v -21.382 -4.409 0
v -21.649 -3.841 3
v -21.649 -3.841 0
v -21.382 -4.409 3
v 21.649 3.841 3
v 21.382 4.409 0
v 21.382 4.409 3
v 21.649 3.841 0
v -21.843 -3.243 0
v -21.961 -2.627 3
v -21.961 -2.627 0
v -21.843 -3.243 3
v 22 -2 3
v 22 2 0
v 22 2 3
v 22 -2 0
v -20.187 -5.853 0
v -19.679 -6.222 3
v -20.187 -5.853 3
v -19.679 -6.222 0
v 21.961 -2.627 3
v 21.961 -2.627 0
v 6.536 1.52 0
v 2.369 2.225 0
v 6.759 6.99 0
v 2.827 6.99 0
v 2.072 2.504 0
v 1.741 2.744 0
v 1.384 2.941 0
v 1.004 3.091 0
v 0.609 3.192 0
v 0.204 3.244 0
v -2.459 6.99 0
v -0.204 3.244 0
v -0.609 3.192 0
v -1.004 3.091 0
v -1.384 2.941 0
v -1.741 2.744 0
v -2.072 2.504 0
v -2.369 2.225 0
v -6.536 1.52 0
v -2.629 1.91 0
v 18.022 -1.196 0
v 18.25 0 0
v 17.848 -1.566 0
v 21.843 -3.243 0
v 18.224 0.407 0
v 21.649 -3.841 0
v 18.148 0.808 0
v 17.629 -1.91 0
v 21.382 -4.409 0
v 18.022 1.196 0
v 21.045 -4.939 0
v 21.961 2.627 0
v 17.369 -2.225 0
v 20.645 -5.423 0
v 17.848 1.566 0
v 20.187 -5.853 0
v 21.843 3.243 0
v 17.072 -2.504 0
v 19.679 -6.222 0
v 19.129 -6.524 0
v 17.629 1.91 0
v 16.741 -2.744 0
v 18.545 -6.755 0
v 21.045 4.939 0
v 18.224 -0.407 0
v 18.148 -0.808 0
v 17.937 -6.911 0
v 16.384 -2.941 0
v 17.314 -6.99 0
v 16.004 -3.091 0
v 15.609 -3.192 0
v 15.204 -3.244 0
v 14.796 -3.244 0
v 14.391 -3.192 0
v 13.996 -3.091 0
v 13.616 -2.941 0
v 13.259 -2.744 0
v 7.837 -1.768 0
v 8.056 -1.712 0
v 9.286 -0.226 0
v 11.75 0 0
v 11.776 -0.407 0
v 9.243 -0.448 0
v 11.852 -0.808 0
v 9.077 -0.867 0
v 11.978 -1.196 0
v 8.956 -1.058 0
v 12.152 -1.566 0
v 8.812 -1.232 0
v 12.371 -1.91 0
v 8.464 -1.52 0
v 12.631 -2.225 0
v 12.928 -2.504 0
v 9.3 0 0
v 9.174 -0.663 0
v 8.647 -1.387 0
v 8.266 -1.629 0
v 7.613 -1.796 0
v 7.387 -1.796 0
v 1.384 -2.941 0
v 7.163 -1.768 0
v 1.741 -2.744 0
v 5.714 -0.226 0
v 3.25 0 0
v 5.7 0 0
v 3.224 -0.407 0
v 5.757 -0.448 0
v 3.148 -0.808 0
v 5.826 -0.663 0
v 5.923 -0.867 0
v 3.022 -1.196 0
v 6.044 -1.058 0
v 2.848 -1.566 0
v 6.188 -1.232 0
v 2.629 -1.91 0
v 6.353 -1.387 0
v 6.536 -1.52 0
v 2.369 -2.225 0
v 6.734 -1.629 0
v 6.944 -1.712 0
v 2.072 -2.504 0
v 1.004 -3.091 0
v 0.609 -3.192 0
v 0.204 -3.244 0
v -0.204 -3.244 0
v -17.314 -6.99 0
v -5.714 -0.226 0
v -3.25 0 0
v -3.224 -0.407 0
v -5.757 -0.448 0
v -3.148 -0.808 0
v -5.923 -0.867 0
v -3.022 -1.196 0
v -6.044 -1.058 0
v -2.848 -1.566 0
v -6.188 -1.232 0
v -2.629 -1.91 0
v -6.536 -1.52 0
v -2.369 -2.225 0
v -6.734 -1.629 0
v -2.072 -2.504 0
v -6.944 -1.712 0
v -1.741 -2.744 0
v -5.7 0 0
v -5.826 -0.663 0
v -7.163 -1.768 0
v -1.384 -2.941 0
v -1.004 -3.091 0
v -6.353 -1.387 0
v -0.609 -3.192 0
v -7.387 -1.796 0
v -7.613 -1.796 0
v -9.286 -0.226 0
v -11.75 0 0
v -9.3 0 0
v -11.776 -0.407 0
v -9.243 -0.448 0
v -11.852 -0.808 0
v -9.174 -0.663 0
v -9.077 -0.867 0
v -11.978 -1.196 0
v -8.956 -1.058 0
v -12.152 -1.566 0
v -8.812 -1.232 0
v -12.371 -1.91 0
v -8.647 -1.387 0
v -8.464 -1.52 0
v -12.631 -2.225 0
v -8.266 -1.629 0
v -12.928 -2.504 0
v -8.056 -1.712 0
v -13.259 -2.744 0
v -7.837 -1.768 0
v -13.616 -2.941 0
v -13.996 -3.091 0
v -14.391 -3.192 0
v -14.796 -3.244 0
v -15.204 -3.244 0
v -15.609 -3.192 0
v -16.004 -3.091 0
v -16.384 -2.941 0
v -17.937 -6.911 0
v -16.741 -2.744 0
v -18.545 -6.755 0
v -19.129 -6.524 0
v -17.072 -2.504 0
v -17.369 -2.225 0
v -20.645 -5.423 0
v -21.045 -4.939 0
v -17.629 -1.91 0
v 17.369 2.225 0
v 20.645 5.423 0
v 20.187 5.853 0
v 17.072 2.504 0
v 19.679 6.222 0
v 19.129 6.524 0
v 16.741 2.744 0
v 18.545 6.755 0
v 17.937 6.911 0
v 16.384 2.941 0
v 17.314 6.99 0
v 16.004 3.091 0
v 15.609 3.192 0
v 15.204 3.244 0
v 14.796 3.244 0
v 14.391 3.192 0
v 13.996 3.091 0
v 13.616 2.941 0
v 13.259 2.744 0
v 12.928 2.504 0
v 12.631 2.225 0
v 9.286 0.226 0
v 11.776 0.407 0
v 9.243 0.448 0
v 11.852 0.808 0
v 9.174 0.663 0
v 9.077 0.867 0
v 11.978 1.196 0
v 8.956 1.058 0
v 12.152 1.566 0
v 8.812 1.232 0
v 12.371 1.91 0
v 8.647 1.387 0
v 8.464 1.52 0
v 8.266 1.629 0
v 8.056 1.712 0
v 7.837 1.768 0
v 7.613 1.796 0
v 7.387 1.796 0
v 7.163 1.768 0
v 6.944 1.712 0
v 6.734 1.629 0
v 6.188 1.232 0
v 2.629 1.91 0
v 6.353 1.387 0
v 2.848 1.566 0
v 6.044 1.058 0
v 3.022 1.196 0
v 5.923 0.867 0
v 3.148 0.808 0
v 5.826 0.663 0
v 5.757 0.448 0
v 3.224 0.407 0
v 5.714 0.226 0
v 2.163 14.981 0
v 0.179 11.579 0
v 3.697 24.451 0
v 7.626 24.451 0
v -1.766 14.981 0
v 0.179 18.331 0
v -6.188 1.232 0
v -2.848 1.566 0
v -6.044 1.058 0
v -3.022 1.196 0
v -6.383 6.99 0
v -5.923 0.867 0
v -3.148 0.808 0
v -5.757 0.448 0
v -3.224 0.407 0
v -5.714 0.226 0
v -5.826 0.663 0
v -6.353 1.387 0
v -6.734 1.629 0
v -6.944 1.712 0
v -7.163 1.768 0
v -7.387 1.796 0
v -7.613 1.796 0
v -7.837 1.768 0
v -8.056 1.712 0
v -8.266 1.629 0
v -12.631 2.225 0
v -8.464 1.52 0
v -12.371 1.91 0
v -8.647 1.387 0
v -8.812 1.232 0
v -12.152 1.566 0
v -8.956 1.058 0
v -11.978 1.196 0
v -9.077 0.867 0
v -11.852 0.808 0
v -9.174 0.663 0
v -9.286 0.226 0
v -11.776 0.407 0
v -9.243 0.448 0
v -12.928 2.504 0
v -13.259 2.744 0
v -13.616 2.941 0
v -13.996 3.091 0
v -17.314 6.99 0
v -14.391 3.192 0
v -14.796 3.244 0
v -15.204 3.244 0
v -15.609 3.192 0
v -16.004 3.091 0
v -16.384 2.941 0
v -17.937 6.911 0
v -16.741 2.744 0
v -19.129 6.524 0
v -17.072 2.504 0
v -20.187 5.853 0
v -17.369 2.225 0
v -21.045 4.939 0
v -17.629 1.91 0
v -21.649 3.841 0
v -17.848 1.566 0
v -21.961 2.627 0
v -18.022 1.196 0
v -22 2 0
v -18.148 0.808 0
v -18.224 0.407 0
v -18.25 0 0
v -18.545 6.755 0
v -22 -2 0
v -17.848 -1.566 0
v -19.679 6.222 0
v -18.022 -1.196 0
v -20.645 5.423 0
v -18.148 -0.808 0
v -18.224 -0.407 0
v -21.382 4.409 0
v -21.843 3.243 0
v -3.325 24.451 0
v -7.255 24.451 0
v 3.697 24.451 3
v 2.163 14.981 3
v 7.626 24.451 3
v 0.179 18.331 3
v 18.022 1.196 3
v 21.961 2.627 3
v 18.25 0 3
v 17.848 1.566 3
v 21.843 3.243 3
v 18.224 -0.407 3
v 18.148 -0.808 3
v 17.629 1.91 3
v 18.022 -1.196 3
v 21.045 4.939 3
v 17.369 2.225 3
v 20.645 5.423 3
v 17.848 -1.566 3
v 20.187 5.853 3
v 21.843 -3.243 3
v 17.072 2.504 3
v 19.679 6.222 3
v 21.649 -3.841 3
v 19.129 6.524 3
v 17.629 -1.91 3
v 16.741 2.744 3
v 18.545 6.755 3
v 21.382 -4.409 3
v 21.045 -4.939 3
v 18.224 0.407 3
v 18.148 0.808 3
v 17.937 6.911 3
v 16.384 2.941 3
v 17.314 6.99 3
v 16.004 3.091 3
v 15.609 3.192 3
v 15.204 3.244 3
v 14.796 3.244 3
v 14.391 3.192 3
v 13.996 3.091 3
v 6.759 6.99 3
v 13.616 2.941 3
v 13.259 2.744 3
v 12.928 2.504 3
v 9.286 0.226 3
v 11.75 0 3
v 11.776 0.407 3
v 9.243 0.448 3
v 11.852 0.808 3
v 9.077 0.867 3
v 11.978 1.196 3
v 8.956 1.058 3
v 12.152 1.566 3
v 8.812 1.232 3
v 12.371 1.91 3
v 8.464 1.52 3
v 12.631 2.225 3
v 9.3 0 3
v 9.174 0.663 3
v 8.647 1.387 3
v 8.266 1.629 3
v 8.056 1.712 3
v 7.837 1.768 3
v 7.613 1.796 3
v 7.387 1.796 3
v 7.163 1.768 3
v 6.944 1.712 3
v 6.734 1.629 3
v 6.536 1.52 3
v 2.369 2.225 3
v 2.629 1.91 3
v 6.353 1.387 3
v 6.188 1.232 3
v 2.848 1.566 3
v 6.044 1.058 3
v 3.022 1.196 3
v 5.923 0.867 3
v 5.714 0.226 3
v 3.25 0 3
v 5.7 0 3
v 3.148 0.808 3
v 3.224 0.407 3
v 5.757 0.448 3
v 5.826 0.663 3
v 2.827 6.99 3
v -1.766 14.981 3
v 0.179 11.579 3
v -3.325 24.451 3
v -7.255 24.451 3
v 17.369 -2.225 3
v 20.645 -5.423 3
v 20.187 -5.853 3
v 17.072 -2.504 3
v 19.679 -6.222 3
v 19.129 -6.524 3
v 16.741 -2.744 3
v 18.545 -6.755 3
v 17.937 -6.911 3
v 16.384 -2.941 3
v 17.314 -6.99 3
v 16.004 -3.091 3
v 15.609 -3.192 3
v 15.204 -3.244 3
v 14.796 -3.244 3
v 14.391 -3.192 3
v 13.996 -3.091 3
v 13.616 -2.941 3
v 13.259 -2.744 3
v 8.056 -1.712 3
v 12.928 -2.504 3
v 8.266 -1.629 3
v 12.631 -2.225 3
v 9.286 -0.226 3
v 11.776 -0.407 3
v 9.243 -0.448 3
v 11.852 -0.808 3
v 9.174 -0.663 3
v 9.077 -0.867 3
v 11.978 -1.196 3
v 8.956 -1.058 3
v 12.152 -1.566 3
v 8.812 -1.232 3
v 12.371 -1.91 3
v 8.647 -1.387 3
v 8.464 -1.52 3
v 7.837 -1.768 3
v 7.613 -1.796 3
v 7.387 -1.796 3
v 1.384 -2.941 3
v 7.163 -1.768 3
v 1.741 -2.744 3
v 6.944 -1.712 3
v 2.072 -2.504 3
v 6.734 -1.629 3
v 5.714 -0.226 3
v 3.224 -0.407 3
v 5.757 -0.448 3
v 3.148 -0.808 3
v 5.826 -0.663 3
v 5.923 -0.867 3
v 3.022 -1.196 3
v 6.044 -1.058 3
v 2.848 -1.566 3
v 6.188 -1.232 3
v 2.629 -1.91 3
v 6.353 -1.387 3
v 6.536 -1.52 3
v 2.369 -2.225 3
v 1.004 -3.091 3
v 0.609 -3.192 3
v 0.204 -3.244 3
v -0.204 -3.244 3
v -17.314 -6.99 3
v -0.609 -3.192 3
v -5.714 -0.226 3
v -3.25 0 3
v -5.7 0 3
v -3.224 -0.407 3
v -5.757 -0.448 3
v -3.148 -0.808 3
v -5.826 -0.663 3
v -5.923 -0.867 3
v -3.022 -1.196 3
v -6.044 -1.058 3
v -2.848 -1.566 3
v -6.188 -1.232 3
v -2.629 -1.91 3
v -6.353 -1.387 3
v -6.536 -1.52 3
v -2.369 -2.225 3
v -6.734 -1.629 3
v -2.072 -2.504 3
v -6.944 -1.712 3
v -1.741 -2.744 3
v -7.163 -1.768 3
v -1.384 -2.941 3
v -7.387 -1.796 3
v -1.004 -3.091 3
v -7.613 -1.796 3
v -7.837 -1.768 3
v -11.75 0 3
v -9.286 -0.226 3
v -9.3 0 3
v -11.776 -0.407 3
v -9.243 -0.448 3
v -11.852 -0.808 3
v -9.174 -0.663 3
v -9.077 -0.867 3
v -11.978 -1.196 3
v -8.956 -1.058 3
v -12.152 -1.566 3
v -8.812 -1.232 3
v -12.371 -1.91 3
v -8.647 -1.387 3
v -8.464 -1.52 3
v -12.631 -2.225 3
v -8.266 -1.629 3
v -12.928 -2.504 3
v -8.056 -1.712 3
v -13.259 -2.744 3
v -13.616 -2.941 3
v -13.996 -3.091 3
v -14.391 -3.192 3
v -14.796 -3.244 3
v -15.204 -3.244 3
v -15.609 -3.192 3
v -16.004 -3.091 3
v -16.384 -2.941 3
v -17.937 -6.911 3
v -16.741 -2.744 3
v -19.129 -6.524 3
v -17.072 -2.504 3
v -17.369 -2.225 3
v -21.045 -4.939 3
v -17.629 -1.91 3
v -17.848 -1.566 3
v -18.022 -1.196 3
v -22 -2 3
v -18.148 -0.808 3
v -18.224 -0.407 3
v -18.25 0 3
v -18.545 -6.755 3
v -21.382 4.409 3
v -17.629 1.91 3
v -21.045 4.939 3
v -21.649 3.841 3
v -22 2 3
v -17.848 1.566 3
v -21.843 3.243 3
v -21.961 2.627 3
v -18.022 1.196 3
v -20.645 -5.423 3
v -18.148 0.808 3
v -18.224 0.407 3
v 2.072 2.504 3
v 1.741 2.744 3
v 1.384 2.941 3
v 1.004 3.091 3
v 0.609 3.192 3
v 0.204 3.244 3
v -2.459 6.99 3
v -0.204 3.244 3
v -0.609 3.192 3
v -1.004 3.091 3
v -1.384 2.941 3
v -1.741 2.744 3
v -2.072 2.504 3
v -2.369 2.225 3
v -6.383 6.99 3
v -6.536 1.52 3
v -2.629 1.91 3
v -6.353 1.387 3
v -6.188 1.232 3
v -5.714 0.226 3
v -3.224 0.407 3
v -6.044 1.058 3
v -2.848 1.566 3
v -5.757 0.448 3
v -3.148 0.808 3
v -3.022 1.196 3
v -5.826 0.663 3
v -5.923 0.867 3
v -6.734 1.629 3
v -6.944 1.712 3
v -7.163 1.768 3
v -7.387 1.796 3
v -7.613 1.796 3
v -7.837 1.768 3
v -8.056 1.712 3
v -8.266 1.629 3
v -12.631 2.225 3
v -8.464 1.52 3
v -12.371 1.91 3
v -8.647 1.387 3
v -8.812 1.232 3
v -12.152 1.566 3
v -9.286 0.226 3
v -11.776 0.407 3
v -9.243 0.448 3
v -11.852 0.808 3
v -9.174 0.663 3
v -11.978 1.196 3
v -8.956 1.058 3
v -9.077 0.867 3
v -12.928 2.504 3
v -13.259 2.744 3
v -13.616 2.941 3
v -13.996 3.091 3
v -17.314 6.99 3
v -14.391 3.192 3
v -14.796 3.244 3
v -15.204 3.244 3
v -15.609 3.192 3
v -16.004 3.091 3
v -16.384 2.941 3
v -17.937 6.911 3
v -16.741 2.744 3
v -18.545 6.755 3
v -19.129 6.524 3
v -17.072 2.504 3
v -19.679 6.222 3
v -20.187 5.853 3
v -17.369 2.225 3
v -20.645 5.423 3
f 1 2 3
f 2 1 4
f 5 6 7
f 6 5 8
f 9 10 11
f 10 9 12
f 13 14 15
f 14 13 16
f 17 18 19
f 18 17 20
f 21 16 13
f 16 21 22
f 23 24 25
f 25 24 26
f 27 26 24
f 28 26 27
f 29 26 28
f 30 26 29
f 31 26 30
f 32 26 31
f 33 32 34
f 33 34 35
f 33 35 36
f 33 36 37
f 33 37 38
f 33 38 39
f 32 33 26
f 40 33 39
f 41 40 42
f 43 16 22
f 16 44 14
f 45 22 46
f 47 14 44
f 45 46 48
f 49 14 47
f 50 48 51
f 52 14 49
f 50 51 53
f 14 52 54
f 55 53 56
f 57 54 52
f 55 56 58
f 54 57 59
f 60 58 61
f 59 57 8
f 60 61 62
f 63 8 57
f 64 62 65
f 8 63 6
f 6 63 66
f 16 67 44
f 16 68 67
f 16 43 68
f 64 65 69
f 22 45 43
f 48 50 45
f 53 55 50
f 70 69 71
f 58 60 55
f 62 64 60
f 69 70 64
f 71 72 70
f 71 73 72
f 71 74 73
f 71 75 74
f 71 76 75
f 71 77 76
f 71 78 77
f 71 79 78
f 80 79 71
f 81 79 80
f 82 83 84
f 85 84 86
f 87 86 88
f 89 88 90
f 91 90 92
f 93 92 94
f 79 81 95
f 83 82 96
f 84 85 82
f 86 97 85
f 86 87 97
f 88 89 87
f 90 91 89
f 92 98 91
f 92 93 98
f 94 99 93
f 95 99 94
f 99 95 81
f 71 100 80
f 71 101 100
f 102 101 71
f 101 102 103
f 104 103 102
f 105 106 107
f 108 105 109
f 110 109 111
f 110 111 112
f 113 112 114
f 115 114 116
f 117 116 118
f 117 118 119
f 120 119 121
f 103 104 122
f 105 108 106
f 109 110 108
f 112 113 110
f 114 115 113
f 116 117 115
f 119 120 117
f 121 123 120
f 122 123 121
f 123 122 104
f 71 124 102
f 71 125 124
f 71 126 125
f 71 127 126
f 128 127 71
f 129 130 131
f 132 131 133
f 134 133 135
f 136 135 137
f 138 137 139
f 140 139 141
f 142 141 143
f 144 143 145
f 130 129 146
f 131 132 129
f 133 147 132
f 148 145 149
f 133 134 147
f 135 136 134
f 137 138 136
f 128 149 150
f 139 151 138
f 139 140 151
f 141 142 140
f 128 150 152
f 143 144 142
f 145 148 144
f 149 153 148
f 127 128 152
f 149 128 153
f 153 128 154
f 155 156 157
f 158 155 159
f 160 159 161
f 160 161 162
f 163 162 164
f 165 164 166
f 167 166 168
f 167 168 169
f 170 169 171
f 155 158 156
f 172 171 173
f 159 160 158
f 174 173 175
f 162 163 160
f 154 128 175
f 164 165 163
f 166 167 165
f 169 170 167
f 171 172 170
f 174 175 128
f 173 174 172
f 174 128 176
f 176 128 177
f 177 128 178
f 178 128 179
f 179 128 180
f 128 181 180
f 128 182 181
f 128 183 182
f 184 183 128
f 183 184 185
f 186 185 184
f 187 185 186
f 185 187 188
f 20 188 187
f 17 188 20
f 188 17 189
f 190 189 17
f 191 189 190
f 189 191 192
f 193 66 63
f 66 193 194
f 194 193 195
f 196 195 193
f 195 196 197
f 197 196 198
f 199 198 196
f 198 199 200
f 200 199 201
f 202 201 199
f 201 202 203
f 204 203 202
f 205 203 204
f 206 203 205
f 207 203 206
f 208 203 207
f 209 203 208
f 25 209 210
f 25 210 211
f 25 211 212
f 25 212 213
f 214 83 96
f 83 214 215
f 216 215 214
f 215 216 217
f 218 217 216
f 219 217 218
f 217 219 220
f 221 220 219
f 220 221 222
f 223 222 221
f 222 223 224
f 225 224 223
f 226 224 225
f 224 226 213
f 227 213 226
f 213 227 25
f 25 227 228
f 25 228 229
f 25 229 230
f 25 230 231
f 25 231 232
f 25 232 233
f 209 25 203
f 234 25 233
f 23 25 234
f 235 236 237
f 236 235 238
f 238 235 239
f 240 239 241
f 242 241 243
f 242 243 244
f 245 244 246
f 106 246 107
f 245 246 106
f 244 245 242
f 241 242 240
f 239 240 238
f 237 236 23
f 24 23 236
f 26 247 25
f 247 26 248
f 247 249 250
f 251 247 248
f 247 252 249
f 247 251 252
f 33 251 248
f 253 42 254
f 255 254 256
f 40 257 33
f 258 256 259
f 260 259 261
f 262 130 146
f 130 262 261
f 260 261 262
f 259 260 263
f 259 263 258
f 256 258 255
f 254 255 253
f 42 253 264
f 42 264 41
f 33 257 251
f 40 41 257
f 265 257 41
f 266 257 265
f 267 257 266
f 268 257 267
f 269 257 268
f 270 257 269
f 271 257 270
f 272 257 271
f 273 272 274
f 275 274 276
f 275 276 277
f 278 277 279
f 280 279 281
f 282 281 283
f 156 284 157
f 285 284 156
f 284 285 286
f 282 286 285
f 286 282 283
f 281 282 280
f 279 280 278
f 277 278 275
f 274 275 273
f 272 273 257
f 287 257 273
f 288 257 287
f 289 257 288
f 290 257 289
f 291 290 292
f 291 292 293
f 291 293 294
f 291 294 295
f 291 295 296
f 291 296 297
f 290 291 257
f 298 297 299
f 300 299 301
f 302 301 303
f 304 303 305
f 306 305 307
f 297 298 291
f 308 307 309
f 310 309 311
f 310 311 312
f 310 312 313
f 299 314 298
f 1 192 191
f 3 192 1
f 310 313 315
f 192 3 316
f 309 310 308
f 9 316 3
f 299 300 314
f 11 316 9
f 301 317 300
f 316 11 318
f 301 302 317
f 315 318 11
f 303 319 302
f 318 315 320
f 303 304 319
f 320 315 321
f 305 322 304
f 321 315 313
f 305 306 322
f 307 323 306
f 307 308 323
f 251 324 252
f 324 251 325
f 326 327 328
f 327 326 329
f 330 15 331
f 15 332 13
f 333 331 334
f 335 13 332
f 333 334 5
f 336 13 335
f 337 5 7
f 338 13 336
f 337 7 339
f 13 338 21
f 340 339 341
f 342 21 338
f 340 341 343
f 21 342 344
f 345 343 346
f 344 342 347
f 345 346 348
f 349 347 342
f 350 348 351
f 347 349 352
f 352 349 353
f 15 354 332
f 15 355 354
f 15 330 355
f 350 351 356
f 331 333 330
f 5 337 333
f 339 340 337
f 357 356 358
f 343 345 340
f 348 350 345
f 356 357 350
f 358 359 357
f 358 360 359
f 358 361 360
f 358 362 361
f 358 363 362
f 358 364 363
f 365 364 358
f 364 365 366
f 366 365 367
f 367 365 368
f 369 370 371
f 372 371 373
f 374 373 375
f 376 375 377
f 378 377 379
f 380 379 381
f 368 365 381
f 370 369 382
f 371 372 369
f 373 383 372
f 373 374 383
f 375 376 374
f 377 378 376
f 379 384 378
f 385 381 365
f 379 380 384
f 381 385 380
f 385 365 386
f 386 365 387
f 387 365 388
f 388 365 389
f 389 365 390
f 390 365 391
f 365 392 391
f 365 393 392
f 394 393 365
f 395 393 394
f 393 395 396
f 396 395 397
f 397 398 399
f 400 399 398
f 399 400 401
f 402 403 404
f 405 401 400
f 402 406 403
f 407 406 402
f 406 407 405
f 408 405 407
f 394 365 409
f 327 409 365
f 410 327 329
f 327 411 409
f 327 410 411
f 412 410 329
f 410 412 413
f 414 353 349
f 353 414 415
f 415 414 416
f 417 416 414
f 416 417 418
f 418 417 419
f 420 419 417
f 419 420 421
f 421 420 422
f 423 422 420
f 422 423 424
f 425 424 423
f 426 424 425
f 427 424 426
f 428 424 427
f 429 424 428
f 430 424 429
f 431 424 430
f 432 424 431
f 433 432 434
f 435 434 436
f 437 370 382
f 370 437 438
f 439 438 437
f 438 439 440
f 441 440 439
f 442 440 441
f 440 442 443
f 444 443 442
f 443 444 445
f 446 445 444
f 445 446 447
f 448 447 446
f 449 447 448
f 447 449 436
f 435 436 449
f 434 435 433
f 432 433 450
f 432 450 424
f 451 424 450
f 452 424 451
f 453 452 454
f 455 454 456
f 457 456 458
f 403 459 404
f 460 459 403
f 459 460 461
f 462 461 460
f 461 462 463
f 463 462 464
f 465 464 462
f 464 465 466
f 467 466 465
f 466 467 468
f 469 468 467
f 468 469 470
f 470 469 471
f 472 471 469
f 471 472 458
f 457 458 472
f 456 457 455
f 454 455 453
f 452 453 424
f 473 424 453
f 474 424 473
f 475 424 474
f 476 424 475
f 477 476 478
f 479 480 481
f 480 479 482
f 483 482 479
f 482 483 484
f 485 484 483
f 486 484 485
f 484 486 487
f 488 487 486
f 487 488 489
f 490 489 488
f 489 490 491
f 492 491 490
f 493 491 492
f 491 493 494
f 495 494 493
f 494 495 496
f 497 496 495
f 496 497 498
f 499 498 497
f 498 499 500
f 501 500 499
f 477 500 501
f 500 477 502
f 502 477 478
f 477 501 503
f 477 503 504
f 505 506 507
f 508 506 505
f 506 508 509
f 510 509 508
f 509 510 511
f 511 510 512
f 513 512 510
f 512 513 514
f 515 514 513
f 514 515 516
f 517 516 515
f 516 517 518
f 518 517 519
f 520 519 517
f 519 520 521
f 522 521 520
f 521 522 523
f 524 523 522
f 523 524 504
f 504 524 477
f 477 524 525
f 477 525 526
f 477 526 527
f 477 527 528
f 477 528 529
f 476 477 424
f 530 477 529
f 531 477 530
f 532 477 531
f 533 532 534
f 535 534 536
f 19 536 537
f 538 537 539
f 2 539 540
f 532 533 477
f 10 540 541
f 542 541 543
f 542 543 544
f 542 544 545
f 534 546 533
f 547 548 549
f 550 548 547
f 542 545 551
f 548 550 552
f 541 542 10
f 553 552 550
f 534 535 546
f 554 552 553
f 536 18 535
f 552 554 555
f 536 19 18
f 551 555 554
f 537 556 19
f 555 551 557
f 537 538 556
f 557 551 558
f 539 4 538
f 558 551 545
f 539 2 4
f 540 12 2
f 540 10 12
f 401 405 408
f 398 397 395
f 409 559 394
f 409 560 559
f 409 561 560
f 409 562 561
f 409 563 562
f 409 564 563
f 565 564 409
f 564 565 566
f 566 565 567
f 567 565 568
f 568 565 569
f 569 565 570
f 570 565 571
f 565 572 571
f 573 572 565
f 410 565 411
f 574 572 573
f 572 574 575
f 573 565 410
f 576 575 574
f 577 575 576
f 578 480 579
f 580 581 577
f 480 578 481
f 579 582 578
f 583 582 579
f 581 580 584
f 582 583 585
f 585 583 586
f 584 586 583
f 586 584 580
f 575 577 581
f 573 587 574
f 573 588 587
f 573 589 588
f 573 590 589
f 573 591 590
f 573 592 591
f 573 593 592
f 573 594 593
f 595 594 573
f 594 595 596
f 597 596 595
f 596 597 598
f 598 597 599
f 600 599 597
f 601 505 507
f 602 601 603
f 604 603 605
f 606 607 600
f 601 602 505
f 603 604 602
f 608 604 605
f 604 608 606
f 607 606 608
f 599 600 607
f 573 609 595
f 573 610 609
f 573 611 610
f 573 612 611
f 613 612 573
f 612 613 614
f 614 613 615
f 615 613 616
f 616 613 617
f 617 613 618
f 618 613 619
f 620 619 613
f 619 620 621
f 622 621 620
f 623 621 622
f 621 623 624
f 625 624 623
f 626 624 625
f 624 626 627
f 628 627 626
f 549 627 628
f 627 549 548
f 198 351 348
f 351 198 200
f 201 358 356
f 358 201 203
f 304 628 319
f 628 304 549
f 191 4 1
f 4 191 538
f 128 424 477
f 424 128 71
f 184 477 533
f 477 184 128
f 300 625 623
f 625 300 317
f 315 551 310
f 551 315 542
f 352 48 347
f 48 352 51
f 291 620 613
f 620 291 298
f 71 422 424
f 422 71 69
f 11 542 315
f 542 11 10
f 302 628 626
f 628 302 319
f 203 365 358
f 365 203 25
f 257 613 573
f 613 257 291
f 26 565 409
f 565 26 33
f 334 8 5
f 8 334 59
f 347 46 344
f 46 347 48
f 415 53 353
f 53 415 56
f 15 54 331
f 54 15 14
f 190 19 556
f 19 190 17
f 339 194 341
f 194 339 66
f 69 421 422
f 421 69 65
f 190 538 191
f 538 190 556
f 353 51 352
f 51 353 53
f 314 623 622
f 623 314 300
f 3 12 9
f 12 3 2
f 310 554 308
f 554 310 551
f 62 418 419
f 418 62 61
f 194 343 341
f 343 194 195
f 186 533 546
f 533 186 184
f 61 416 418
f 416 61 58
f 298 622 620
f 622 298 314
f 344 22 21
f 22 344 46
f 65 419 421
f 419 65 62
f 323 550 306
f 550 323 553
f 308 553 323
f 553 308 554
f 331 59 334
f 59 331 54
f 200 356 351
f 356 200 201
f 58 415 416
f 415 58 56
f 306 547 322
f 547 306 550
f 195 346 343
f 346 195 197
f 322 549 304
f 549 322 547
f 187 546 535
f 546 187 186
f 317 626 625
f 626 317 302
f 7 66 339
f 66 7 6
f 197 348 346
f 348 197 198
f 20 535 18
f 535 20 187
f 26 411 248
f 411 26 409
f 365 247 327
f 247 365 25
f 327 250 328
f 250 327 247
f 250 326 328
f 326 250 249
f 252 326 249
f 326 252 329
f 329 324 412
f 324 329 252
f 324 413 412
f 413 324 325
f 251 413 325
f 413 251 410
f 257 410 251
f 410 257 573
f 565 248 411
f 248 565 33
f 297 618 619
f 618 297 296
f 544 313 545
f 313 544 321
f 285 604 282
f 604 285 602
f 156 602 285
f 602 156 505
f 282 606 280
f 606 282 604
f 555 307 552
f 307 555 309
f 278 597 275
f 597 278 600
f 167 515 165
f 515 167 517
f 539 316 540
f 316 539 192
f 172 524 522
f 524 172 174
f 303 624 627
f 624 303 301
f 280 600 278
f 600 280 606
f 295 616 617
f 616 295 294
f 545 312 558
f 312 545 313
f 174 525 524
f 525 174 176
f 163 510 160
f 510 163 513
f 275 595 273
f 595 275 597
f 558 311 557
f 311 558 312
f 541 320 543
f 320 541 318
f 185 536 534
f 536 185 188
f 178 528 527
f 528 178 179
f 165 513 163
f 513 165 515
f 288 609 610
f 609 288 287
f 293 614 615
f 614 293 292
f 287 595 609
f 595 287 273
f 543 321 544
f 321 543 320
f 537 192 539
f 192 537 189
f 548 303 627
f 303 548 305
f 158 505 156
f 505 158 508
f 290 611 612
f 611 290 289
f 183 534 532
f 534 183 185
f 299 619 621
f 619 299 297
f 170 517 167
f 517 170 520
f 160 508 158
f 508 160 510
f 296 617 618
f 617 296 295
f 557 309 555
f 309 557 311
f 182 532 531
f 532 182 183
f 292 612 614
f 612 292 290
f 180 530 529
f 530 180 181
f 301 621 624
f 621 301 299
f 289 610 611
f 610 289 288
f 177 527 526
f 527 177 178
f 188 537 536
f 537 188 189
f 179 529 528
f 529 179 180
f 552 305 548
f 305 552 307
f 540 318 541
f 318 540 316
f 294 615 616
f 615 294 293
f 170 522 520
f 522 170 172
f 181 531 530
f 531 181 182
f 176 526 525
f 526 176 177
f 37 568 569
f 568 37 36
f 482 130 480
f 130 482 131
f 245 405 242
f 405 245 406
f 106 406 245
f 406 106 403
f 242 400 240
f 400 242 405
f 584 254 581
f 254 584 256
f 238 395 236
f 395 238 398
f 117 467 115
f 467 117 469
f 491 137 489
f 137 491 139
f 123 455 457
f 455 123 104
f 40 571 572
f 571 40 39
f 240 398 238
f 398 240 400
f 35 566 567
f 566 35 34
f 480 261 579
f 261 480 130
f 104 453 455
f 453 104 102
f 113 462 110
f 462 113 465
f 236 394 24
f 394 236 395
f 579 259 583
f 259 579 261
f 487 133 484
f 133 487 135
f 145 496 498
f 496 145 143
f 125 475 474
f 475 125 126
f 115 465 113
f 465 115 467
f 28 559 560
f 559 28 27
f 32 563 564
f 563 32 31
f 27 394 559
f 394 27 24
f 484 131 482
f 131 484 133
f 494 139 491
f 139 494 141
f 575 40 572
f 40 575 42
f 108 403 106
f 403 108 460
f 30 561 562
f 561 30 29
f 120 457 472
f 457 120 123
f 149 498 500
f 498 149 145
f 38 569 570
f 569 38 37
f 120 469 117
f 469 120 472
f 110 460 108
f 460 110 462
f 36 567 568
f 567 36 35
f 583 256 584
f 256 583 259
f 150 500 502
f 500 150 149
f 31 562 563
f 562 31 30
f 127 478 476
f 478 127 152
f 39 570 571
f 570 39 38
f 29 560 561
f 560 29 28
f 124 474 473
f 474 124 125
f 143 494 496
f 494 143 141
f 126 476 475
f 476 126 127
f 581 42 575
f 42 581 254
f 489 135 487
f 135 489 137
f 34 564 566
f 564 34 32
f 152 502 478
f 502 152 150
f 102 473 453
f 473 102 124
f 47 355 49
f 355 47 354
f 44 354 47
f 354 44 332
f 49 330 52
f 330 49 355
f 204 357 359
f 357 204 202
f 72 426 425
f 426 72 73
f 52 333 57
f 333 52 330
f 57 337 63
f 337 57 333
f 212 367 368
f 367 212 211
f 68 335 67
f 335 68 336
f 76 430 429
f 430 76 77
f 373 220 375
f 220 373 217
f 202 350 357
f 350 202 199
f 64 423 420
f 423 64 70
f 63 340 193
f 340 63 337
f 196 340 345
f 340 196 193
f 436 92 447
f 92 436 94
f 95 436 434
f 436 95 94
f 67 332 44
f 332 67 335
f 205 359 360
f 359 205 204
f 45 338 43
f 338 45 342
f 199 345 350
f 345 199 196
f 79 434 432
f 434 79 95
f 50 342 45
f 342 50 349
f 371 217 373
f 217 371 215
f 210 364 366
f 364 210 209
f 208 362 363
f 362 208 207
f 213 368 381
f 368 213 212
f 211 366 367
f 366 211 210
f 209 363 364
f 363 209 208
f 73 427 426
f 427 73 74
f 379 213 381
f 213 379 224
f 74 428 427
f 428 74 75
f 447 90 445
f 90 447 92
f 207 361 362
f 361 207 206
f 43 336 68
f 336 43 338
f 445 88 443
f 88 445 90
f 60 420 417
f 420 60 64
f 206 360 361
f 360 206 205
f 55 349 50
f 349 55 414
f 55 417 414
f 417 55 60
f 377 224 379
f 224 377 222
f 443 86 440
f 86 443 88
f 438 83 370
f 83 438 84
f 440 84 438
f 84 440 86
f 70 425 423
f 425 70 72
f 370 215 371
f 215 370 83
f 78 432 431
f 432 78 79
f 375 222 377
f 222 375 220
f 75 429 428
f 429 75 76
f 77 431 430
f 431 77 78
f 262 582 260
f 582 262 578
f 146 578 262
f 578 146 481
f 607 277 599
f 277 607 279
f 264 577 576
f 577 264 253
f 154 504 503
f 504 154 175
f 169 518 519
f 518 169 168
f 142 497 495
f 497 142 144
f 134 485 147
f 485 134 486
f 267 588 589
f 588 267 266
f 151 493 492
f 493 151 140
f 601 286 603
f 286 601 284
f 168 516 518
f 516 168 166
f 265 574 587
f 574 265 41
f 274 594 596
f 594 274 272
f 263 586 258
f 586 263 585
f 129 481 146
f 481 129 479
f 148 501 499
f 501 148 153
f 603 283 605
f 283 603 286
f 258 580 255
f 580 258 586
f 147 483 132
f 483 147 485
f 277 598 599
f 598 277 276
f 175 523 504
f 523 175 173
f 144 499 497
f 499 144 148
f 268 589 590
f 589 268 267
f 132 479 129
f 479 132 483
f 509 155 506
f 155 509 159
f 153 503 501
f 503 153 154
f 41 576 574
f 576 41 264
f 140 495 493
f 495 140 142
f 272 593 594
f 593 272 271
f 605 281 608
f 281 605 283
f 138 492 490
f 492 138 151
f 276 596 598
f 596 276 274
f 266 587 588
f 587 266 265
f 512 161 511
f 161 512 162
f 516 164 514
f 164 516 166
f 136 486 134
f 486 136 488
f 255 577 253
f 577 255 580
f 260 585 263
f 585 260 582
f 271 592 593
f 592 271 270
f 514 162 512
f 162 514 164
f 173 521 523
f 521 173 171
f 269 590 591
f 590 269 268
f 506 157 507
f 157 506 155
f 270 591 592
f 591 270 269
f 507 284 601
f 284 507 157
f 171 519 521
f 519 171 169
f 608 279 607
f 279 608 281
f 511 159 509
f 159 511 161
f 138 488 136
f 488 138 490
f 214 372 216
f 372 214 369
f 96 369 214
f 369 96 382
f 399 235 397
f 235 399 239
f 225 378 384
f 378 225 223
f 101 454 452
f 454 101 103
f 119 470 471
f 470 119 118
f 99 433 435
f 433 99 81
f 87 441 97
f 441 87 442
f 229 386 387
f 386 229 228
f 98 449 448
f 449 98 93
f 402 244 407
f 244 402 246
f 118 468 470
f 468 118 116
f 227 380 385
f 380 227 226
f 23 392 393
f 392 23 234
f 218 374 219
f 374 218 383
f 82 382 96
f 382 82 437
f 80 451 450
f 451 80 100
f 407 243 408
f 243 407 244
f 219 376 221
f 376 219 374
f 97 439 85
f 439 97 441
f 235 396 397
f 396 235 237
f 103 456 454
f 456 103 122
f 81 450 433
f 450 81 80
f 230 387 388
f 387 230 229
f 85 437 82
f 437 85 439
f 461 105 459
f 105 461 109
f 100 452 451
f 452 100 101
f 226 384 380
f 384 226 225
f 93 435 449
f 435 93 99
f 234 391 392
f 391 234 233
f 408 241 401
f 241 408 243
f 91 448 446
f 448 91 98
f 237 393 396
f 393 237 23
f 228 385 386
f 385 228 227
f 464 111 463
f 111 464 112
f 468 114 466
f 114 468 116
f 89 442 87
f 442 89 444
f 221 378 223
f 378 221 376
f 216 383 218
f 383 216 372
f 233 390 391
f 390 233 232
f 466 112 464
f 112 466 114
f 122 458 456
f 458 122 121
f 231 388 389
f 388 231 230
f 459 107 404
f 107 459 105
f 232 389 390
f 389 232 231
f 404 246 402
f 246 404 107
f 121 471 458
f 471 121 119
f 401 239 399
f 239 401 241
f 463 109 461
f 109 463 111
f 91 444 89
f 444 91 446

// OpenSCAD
$fn = 50;


difference() {
	union() {
		hull() {
			translate(v = [-17.0000000000, 2.0000000000, 0]) {
				cylinder(h = 3, r = 5);
			}
			translate(v = [17.0000000000, 2.0000000000, 0]) {
				cylinder(h = 3, r = 5);
			}
			translate(v = [-17.0000000000, -2.0000000000, 0]) {
				cylinder(h = 3, r = 5);
			}
			translate(v = [17.0000000000, -2.0000000000, 0]) {
				cylinder(h = 3, r = 5);
			}
		}
		translate(v = [0, 24, 0]) {
			linear_extrude(height = 3) {
				text(font = "DejaVu Sans Mono:style=Bold", halign = "center", size = 19.0000000000, text = "X", valign = "top");
			}
		}
	}
	union() {
		translate(v = [-15.0000000000, 0.0000000000, 0]) {
			translate(v = [0, 0, -100]) {
				cylinder(h = 200, r = 3.2500000000);
			}
		}
		translate(v = [0, 0, -100]) {
			cylinder(h = 200, r = 3.2500000000);
		}
		translate(v = [15.0000000000, 0.0000000000, 0]) {
			translate(v = [0, 0, -100]) {
				cylinder(h = 200, r = 3.2500000000);
			}
		}
		translate(v = [-15.0000000000, 0.0000000000, 0]) {
			translate(v = [0, 0, -100]) {
				cylinder(h = 200, r = 1.8000000000);
			}
		}
		translate(v = [-7.5000000000, 0.0000000000, 0]) {
			translate(v = [0, 0, -100]) {
				cylinder(h = 200, r = 1.8000000000);
			}
		}
		translate(v = [0, 0, -100]) {
			cylinder(h = 200, r = 1.8000000000);
		}
		translate(v = [7.5000000000, 0.0000000000, 0]) {
			translate(v = [0, 0, -100]) {
				cylinder(h = 200, r = 1.8000000000);
			}
		}
		translate(v = [15.0000000000, 0.0000000000, 0]) {
			translate(v = [0, 0, -100]) {
				cylinder(h = 200, r = 1.8000000000);
			}
		}
	}
}
